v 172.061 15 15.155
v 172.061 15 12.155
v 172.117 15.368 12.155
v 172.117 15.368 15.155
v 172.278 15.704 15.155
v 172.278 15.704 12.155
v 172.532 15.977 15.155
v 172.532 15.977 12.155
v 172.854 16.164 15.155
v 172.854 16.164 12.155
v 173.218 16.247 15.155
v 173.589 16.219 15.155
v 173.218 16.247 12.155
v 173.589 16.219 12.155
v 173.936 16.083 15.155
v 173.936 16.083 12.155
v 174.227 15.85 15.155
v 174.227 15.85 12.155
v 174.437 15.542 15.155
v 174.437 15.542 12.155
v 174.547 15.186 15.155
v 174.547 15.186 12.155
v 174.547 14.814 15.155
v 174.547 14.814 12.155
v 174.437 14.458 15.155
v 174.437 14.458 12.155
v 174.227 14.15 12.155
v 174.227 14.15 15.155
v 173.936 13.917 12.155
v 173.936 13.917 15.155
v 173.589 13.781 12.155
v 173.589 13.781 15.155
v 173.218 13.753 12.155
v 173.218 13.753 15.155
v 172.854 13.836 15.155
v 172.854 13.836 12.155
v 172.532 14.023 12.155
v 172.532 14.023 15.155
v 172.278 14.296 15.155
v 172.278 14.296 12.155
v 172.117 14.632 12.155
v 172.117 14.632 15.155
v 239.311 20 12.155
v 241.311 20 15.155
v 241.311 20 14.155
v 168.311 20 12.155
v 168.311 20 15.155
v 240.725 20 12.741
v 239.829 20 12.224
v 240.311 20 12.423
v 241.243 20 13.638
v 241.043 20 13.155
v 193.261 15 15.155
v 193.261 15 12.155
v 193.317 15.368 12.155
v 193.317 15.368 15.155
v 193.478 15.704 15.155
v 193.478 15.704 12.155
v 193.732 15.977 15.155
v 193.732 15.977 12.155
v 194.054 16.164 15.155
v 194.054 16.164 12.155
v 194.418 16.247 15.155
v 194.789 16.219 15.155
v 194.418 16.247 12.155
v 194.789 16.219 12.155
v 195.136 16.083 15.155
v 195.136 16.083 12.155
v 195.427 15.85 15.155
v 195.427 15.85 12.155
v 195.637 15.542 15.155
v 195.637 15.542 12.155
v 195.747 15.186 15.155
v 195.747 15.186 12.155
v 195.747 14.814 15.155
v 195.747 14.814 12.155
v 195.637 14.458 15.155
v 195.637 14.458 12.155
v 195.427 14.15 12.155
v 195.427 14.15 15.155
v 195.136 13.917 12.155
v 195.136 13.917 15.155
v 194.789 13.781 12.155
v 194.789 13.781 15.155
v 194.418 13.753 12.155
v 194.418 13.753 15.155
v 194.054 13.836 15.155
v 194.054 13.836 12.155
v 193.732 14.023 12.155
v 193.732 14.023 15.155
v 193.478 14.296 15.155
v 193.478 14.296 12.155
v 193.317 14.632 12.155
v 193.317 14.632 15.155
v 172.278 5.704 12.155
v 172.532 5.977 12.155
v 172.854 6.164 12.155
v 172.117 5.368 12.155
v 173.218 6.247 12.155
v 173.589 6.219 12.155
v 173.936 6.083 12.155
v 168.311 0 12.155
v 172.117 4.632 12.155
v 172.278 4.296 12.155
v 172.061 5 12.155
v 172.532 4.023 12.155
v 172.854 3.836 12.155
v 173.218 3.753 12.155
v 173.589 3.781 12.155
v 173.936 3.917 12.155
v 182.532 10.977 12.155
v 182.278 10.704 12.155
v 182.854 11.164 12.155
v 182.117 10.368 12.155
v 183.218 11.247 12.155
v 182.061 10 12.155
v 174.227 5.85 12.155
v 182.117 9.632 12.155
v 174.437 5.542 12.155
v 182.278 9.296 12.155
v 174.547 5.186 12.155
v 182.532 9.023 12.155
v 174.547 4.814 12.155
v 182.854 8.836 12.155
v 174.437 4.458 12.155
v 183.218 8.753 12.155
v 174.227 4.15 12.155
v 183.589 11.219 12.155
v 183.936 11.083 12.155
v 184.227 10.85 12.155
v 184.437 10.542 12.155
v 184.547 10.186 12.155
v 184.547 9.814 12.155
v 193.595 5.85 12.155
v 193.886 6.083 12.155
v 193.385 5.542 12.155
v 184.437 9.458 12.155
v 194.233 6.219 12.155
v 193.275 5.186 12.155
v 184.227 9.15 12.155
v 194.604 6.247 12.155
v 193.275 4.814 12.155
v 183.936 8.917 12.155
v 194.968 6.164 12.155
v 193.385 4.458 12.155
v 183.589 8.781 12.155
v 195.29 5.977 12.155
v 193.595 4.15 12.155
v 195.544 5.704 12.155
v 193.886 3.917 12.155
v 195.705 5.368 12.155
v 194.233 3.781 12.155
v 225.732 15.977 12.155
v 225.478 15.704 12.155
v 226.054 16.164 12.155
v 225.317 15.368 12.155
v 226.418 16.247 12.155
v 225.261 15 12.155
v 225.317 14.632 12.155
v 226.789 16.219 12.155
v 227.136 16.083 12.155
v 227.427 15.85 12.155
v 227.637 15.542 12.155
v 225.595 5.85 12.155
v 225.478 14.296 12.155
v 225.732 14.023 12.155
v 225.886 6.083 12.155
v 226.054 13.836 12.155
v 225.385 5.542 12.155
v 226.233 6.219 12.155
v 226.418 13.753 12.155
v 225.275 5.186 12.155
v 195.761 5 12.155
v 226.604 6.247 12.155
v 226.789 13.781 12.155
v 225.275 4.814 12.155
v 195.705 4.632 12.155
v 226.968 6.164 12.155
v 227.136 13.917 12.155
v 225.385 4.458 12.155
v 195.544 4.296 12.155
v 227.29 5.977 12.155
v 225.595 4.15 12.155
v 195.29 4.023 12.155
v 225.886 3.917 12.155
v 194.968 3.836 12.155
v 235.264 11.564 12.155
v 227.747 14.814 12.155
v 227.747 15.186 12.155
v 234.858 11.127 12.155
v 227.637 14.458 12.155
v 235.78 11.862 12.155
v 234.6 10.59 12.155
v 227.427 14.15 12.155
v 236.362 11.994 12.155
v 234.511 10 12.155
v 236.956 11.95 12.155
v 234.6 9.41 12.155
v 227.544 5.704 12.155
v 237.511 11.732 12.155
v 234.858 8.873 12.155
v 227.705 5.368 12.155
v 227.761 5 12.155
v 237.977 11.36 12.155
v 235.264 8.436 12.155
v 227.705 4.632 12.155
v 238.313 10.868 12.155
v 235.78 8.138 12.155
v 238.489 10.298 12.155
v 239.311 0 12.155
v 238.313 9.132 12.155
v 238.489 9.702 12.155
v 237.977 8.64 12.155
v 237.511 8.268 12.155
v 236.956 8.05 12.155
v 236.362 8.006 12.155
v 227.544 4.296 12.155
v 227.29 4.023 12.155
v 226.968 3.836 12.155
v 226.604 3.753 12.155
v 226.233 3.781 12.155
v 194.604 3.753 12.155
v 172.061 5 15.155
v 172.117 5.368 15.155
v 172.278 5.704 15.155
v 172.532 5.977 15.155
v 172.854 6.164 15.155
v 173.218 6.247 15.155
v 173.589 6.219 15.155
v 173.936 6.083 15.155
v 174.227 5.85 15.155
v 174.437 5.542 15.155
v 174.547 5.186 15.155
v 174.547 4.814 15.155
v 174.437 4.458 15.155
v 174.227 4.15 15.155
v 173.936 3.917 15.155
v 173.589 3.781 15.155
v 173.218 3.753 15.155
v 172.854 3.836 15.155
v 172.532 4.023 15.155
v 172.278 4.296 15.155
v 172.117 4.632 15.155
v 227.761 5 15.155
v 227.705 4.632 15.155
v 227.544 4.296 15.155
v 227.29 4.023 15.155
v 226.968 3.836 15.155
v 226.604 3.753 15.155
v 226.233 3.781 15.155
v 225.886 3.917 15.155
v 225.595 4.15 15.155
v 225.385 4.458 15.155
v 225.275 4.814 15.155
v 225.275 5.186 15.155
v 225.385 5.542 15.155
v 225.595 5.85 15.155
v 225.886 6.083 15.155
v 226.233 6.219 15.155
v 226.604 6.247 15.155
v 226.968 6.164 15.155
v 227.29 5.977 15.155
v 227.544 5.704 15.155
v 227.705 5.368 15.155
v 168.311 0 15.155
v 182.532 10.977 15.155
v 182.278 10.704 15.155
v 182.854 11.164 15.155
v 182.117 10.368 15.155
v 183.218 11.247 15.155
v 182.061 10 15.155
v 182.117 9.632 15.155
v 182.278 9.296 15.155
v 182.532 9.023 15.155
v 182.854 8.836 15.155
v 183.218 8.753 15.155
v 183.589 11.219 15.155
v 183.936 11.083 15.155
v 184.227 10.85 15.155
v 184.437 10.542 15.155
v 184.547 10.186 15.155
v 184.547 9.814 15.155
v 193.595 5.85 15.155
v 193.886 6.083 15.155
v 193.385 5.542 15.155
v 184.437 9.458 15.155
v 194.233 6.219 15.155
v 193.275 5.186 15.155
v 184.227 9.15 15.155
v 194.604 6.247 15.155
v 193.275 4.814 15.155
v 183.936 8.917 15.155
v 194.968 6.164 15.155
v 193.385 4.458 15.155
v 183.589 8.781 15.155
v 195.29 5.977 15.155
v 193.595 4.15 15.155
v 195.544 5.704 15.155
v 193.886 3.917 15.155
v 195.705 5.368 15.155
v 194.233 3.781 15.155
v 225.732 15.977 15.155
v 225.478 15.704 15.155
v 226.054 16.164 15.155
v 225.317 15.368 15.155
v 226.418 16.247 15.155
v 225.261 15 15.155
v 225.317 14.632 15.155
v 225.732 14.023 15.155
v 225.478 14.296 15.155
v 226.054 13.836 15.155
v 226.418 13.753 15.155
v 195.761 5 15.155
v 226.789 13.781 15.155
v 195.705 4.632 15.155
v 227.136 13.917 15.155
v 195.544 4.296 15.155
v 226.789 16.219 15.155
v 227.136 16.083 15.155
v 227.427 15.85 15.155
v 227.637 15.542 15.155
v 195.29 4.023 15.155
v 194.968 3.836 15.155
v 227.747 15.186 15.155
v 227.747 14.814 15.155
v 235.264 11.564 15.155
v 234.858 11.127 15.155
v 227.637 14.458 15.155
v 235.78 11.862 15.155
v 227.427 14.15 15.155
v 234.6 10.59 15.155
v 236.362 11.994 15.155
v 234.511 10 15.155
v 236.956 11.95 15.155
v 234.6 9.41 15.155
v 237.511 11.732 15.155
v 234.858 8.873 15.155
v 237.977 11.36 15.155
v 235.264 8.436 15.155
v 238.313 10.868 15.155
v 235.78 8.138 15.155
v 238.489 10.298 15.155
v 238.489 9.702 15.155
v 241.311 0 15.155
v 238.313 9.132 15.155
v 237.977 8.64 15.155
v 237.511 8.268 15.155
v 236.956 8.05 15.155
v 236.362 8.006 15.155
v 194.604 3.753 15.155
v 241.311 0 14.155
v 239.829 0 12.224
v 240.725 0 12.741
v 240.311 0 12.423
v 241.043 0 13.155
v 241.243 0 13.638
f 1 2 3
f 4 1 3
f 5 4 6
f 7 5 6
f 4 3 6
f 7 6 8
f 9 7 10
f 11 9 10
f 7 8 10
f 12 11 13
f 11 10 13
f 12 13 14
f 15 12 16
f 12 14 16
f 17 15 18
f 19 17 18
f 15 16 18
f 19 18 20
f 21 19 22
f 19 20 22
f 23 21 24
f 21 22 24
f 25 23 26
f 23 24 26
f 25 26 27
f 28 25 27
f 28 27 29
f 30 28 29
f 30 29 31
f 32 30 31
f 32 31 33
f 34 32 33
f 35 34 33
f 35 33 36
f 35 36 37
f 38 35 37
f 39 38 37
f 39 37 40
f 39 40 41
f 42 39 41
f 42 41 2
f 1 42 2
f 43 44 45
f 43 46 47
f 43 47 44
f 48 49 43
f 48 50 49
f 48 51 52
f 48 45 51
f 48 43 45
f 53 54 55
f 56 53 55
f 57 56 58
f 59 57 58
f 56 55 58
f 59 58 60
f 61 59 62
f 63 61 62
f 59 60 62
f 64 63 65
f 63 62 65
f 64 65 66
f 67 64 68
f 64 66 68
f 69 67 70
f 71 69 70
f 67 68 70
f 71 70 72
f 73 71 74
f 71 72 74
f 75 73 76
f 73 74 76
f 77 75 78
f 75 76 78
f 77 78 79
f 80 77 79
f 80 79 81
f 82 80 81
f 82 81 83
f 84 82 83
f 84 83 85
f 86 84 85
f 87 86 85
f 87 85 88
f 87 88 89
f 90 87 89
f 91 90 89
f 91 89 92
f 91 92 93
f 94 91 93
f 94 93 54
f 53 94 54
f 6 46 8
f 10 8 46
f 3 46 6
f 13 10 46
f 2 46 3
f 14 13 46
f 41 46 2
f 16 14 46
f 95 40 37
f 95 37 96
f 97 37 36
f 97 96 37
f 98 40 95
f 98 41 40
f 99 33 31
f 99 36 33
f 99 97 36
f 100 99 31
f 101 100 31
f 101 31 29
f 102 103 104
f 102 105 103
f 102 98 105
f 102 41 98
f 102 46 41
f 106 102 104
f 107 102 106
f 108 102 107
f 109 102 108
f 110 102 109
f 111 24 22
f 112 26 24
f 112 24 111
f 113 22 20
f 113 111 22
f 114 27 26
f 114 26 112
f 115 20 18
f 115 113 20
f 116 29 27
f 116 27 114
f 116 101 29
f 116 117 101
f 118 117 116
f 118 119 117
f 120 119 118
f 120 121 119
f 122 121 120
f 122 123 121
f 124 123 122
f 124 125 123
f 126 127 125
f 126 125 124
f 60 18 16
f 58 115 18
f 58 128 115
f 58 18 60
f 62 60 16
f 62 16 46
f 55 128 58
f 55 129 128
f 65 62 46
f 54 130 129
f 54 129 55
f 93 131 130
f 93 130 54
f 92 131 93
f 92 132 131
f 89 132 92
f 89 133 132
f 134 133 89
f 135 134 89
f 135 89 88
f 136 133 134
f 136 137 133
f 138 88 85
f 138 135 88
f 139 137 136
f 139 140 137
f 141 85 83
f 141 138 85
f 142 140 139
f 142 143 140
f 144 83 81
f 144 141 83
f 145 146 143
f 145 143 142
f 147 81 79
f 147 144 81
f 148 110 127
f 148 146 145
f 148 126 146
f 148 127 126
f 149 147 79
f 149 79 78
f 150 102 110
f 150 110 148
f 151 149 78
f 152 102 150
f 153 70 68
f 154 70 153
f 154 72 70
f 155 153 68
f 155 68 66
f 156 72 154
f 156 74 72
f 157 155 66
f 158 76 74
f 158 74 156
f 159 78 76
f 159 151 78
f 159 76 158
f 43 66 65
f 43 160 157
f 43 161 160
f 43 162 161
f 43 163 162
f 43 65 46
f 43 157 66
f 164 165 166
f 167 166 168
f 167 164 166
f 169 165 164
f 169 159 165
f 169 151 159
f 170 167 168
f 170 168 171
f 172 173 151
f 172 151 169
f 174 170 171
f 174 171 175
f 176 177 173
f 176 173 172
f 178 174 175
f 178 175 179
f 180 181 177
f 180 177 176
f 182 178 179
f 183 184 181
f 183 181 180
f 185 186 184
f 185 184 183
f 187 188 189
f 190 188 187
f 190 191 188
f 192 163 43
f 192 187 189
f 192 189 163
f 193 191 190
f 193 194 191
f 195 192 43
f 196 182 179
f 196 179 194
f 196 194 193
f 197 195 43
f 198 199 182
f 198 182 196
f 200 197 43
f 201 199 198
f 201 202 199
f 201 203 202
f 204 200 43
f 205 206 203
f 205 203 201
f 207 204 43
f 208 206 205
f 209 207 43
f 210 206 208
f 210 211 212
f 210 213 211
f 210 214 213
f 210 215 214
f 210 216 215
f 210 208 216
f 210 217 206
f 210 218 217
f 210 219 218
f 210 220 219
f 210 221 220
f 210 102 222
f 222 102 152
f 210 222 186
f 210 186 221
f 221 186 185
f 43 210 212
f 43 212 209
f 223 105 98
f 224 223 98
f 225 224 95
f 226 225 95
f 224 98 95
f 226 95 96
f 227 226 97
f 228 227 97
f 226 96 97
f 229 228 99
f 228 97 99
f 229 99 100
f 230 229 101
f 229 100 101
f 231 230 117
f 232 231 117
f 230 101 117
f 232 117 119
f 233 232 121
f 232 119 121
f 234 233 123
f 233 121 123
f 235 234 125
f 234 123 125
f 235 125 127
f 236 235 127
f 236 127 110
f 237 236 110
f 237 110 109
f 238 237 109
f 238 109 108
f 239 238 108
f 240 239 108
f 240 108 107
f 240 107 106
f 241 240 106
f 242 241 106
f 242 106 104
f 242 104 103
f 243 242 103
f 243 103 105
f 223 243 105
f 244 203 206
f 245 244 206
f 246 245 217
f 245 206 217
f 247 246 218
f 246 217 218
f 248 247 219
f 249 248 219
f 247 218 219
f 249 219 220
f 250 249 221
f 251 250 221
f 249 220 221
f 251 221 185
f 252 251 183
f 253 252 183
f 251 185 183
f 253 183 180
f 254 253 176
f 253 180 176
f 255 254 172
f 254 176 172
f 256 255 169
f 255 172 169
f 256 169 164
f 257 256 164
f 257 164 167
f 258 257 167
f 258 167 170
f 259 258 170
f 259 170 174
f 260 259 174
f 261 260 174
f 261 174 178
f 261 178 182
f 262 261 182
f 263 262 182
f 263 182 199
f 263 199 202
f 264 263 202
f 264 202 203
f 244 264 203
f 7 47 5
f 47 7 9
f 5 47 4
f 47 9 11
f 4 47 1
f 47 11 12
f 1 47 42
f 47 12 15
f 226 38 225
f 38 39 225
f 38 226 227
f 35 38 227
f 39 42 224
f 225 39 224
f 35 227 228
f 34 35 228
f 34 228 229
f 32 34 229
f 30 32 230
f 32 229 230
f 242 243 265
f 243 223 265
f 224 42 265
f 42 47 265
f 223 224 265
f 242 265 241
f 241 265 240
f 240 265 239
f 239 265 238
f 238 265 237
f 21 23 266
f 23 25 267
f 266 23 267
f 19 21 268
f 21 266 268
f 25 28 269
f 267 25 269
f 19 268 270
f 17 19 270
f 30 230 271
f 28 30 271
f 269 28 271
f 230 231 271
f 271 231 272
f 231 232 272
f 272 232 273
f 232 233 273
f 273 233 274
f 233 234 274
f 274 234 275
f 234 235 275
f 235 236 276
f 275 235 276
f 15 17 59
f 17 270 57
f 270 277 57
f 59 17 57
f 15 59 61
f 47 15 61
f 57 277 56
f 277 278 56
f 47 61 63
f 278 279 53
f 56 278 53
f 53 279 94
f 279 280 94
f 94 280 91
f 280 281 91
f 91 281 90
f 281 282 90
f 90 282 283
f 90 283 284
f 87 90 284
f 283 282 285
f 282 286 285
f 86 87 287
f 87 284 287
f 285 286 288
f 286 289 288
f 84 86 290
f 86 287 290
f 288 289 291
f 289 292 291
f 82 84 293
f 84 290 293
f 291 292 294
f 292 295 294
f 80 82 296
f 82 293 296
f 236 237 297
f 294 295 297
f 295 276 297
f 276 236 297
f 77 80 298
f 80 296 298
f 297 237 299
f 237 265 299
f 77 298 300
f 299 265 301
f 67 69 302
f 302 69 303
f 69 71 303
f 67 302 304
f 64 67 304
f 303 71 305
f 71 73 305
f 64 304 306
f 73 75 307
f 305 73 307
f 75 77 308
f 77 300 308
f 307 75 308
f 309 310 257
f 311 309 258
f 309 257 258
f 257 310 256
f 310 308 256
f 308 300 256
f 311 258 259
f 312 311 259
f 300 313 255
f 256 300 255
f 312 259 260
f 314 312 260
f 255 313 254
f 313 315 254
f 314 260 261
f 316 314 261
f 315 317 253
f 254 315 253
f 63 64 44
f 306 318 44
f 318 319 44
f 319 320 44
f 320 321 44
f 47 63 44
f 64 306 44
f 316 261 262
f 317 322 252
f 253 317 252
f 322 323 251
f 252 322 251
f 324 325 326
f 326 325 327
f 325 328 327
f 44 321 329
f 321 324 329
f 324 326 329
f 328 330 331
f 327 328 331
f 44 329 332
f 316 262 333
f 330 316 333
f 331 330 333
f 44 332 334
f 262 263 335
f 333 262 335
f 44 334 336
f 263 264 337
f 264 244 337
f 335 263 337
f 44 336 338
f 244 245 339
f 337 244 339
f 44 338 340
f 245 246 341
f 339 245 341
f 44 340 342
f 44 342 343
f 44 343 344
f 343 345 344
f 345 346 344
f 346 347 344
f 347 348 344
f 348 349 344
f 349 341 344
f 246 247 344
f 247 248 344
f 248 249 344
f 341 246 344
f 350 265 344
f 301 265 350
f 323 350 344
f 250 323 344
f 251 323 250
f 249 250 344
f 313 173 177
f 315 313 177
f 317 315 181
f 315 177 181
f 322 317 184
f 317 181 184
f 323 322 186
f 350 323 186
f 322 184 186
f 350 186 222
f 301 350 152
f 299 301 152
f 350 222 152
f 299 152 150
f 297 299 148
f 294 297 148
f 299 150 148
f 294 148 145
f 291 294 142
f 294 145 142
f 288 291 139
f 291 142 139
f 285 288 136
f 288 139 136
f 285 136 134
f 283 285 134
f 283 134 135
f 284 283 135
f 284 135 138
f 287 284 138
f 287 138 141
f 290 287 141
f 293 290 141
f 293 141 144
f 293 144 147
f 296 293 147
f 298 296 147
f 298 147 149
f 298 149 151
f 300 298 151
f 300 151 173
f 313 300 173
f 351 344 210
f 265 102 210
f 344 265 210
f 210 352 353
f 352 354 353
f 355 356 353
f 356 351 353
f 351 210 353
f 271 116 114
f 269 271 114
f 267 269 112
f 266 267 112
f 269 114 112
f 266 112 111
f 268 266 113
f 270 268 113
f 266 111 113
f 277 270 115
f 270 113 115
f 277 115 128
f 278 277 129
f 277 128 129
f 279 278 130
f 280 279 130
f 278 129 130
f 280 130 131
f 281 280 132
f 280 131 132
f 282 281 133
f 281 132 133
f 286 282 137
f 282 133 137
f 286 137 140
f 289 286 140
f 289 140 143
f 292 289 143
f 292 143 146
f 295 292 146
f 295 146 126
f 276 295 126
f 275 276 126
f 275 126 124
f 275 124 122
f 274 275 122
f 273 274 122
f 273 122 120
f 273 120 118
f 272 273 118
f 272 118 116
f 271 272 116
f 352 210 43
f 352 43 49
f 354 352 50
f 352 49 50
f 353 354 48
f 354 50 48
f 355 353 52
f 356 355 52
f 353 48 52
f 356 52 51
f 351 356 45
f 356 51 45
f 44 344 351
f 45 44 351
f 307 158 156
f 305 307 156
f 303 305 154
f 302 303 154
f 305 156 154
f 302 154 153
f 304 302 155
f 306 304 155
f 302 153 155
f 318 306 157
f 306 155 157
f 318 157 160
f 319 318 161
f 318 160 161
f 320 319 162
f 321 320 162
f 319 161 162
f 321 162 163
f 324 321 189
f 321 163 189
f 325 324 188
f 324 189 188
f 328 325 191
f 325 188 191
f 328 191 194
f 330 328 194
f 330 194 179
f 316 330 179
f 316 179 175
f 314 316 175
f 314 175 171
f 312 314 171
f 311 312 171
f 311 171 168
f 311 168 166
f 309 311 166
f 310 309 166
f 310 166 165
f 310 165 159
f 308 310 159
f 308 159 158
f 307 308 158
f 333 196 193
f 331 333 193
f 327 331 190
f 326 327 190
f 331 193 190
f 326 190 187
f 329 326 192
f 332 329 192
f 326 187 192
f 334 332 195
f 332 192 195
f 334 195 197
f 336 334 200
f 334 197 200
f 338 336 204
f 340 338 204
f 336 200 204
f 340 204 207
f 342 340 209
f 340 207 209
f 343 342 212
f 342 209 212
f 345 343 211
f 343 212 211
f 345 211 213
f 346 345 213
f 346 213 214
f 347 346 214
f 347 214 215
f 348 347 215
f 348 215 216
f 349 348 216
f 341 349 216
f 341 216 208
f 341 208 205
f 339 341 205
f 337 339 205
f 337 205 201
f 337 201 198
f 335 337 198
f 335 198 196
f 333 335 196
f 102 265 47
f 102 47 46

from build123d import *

# Parameters (mm, degrees)
SKETCH_1_W          = 73
SKETCH_1_H          = 3
EXTRUDE_1_DEPTH     = 20
SKETCH_2_R          = 1.25
SKETCH_2_R_2        = 2
CUT_EXTRUDE_1_DEPTH = 20
FILLET_1_R          = 2


with BuildPart() as part:
    # Эскиз1 → Бобышка-Вытянуть1 (new body)
    with BuildSketch(Plane(origin=(0, 0, 0), x_dir=(1, 0, 0), z_dir=(0, 1, 0))):
        with Locations((204.810975887, -13.655372437)):
            Rectangle(SKETCH_1_W, SKETCH_1_H)
    extrude(amount=EXTRUDE_1_DEPTH)

    # Эскиз2 → Вырез-Вытянуть1 (cut)
    with BuildSketch(Plane(origin=(0, 0, 12.155372437), x_dir=(-1, 0, 0), z_dir=(0, 0, -1))):
        with Locations((-173.310975887, 15)):
            Circle(SKETCH_2_R)
        with Locations((-183.310975887, 10)):
            Circle(SKETCH_2_R)
        with Locations((-173.310975887, 5)):
            Circle(SKETCH_2_R)
        with Locations((-236.510975887, 10)):
            Circle(SKETCH_2_R_2)
        with Locations((-194.510975887, 15)):
            Circle(SKETCH_2_R)
        with Locations(Location((-194.510975887, 5, 0), (0, 0, 180))):
            Circle(SKETCH_2_R)
        with Locations((-226.510975887, 15)):
            Circle(SKETCH_2_R)
        with Locations(Location((-226.510975887, 5, 0), (0, 0, 180))):
            Circle(SKETCH_2_R)
    extrude(amount=-CUT_EXTRUDE_1_DEPTH, mode=Mode.SUBTRACT)

    # Скругление1
    fillet_1_edges = [part.edges().sort_by_distance(p)[0] for p in [
        (241.310975887, 10, 12.155372437),
    ]]
    fillet(fillet_1_edges, radius=FILLET_1_R)


solid = part.part
